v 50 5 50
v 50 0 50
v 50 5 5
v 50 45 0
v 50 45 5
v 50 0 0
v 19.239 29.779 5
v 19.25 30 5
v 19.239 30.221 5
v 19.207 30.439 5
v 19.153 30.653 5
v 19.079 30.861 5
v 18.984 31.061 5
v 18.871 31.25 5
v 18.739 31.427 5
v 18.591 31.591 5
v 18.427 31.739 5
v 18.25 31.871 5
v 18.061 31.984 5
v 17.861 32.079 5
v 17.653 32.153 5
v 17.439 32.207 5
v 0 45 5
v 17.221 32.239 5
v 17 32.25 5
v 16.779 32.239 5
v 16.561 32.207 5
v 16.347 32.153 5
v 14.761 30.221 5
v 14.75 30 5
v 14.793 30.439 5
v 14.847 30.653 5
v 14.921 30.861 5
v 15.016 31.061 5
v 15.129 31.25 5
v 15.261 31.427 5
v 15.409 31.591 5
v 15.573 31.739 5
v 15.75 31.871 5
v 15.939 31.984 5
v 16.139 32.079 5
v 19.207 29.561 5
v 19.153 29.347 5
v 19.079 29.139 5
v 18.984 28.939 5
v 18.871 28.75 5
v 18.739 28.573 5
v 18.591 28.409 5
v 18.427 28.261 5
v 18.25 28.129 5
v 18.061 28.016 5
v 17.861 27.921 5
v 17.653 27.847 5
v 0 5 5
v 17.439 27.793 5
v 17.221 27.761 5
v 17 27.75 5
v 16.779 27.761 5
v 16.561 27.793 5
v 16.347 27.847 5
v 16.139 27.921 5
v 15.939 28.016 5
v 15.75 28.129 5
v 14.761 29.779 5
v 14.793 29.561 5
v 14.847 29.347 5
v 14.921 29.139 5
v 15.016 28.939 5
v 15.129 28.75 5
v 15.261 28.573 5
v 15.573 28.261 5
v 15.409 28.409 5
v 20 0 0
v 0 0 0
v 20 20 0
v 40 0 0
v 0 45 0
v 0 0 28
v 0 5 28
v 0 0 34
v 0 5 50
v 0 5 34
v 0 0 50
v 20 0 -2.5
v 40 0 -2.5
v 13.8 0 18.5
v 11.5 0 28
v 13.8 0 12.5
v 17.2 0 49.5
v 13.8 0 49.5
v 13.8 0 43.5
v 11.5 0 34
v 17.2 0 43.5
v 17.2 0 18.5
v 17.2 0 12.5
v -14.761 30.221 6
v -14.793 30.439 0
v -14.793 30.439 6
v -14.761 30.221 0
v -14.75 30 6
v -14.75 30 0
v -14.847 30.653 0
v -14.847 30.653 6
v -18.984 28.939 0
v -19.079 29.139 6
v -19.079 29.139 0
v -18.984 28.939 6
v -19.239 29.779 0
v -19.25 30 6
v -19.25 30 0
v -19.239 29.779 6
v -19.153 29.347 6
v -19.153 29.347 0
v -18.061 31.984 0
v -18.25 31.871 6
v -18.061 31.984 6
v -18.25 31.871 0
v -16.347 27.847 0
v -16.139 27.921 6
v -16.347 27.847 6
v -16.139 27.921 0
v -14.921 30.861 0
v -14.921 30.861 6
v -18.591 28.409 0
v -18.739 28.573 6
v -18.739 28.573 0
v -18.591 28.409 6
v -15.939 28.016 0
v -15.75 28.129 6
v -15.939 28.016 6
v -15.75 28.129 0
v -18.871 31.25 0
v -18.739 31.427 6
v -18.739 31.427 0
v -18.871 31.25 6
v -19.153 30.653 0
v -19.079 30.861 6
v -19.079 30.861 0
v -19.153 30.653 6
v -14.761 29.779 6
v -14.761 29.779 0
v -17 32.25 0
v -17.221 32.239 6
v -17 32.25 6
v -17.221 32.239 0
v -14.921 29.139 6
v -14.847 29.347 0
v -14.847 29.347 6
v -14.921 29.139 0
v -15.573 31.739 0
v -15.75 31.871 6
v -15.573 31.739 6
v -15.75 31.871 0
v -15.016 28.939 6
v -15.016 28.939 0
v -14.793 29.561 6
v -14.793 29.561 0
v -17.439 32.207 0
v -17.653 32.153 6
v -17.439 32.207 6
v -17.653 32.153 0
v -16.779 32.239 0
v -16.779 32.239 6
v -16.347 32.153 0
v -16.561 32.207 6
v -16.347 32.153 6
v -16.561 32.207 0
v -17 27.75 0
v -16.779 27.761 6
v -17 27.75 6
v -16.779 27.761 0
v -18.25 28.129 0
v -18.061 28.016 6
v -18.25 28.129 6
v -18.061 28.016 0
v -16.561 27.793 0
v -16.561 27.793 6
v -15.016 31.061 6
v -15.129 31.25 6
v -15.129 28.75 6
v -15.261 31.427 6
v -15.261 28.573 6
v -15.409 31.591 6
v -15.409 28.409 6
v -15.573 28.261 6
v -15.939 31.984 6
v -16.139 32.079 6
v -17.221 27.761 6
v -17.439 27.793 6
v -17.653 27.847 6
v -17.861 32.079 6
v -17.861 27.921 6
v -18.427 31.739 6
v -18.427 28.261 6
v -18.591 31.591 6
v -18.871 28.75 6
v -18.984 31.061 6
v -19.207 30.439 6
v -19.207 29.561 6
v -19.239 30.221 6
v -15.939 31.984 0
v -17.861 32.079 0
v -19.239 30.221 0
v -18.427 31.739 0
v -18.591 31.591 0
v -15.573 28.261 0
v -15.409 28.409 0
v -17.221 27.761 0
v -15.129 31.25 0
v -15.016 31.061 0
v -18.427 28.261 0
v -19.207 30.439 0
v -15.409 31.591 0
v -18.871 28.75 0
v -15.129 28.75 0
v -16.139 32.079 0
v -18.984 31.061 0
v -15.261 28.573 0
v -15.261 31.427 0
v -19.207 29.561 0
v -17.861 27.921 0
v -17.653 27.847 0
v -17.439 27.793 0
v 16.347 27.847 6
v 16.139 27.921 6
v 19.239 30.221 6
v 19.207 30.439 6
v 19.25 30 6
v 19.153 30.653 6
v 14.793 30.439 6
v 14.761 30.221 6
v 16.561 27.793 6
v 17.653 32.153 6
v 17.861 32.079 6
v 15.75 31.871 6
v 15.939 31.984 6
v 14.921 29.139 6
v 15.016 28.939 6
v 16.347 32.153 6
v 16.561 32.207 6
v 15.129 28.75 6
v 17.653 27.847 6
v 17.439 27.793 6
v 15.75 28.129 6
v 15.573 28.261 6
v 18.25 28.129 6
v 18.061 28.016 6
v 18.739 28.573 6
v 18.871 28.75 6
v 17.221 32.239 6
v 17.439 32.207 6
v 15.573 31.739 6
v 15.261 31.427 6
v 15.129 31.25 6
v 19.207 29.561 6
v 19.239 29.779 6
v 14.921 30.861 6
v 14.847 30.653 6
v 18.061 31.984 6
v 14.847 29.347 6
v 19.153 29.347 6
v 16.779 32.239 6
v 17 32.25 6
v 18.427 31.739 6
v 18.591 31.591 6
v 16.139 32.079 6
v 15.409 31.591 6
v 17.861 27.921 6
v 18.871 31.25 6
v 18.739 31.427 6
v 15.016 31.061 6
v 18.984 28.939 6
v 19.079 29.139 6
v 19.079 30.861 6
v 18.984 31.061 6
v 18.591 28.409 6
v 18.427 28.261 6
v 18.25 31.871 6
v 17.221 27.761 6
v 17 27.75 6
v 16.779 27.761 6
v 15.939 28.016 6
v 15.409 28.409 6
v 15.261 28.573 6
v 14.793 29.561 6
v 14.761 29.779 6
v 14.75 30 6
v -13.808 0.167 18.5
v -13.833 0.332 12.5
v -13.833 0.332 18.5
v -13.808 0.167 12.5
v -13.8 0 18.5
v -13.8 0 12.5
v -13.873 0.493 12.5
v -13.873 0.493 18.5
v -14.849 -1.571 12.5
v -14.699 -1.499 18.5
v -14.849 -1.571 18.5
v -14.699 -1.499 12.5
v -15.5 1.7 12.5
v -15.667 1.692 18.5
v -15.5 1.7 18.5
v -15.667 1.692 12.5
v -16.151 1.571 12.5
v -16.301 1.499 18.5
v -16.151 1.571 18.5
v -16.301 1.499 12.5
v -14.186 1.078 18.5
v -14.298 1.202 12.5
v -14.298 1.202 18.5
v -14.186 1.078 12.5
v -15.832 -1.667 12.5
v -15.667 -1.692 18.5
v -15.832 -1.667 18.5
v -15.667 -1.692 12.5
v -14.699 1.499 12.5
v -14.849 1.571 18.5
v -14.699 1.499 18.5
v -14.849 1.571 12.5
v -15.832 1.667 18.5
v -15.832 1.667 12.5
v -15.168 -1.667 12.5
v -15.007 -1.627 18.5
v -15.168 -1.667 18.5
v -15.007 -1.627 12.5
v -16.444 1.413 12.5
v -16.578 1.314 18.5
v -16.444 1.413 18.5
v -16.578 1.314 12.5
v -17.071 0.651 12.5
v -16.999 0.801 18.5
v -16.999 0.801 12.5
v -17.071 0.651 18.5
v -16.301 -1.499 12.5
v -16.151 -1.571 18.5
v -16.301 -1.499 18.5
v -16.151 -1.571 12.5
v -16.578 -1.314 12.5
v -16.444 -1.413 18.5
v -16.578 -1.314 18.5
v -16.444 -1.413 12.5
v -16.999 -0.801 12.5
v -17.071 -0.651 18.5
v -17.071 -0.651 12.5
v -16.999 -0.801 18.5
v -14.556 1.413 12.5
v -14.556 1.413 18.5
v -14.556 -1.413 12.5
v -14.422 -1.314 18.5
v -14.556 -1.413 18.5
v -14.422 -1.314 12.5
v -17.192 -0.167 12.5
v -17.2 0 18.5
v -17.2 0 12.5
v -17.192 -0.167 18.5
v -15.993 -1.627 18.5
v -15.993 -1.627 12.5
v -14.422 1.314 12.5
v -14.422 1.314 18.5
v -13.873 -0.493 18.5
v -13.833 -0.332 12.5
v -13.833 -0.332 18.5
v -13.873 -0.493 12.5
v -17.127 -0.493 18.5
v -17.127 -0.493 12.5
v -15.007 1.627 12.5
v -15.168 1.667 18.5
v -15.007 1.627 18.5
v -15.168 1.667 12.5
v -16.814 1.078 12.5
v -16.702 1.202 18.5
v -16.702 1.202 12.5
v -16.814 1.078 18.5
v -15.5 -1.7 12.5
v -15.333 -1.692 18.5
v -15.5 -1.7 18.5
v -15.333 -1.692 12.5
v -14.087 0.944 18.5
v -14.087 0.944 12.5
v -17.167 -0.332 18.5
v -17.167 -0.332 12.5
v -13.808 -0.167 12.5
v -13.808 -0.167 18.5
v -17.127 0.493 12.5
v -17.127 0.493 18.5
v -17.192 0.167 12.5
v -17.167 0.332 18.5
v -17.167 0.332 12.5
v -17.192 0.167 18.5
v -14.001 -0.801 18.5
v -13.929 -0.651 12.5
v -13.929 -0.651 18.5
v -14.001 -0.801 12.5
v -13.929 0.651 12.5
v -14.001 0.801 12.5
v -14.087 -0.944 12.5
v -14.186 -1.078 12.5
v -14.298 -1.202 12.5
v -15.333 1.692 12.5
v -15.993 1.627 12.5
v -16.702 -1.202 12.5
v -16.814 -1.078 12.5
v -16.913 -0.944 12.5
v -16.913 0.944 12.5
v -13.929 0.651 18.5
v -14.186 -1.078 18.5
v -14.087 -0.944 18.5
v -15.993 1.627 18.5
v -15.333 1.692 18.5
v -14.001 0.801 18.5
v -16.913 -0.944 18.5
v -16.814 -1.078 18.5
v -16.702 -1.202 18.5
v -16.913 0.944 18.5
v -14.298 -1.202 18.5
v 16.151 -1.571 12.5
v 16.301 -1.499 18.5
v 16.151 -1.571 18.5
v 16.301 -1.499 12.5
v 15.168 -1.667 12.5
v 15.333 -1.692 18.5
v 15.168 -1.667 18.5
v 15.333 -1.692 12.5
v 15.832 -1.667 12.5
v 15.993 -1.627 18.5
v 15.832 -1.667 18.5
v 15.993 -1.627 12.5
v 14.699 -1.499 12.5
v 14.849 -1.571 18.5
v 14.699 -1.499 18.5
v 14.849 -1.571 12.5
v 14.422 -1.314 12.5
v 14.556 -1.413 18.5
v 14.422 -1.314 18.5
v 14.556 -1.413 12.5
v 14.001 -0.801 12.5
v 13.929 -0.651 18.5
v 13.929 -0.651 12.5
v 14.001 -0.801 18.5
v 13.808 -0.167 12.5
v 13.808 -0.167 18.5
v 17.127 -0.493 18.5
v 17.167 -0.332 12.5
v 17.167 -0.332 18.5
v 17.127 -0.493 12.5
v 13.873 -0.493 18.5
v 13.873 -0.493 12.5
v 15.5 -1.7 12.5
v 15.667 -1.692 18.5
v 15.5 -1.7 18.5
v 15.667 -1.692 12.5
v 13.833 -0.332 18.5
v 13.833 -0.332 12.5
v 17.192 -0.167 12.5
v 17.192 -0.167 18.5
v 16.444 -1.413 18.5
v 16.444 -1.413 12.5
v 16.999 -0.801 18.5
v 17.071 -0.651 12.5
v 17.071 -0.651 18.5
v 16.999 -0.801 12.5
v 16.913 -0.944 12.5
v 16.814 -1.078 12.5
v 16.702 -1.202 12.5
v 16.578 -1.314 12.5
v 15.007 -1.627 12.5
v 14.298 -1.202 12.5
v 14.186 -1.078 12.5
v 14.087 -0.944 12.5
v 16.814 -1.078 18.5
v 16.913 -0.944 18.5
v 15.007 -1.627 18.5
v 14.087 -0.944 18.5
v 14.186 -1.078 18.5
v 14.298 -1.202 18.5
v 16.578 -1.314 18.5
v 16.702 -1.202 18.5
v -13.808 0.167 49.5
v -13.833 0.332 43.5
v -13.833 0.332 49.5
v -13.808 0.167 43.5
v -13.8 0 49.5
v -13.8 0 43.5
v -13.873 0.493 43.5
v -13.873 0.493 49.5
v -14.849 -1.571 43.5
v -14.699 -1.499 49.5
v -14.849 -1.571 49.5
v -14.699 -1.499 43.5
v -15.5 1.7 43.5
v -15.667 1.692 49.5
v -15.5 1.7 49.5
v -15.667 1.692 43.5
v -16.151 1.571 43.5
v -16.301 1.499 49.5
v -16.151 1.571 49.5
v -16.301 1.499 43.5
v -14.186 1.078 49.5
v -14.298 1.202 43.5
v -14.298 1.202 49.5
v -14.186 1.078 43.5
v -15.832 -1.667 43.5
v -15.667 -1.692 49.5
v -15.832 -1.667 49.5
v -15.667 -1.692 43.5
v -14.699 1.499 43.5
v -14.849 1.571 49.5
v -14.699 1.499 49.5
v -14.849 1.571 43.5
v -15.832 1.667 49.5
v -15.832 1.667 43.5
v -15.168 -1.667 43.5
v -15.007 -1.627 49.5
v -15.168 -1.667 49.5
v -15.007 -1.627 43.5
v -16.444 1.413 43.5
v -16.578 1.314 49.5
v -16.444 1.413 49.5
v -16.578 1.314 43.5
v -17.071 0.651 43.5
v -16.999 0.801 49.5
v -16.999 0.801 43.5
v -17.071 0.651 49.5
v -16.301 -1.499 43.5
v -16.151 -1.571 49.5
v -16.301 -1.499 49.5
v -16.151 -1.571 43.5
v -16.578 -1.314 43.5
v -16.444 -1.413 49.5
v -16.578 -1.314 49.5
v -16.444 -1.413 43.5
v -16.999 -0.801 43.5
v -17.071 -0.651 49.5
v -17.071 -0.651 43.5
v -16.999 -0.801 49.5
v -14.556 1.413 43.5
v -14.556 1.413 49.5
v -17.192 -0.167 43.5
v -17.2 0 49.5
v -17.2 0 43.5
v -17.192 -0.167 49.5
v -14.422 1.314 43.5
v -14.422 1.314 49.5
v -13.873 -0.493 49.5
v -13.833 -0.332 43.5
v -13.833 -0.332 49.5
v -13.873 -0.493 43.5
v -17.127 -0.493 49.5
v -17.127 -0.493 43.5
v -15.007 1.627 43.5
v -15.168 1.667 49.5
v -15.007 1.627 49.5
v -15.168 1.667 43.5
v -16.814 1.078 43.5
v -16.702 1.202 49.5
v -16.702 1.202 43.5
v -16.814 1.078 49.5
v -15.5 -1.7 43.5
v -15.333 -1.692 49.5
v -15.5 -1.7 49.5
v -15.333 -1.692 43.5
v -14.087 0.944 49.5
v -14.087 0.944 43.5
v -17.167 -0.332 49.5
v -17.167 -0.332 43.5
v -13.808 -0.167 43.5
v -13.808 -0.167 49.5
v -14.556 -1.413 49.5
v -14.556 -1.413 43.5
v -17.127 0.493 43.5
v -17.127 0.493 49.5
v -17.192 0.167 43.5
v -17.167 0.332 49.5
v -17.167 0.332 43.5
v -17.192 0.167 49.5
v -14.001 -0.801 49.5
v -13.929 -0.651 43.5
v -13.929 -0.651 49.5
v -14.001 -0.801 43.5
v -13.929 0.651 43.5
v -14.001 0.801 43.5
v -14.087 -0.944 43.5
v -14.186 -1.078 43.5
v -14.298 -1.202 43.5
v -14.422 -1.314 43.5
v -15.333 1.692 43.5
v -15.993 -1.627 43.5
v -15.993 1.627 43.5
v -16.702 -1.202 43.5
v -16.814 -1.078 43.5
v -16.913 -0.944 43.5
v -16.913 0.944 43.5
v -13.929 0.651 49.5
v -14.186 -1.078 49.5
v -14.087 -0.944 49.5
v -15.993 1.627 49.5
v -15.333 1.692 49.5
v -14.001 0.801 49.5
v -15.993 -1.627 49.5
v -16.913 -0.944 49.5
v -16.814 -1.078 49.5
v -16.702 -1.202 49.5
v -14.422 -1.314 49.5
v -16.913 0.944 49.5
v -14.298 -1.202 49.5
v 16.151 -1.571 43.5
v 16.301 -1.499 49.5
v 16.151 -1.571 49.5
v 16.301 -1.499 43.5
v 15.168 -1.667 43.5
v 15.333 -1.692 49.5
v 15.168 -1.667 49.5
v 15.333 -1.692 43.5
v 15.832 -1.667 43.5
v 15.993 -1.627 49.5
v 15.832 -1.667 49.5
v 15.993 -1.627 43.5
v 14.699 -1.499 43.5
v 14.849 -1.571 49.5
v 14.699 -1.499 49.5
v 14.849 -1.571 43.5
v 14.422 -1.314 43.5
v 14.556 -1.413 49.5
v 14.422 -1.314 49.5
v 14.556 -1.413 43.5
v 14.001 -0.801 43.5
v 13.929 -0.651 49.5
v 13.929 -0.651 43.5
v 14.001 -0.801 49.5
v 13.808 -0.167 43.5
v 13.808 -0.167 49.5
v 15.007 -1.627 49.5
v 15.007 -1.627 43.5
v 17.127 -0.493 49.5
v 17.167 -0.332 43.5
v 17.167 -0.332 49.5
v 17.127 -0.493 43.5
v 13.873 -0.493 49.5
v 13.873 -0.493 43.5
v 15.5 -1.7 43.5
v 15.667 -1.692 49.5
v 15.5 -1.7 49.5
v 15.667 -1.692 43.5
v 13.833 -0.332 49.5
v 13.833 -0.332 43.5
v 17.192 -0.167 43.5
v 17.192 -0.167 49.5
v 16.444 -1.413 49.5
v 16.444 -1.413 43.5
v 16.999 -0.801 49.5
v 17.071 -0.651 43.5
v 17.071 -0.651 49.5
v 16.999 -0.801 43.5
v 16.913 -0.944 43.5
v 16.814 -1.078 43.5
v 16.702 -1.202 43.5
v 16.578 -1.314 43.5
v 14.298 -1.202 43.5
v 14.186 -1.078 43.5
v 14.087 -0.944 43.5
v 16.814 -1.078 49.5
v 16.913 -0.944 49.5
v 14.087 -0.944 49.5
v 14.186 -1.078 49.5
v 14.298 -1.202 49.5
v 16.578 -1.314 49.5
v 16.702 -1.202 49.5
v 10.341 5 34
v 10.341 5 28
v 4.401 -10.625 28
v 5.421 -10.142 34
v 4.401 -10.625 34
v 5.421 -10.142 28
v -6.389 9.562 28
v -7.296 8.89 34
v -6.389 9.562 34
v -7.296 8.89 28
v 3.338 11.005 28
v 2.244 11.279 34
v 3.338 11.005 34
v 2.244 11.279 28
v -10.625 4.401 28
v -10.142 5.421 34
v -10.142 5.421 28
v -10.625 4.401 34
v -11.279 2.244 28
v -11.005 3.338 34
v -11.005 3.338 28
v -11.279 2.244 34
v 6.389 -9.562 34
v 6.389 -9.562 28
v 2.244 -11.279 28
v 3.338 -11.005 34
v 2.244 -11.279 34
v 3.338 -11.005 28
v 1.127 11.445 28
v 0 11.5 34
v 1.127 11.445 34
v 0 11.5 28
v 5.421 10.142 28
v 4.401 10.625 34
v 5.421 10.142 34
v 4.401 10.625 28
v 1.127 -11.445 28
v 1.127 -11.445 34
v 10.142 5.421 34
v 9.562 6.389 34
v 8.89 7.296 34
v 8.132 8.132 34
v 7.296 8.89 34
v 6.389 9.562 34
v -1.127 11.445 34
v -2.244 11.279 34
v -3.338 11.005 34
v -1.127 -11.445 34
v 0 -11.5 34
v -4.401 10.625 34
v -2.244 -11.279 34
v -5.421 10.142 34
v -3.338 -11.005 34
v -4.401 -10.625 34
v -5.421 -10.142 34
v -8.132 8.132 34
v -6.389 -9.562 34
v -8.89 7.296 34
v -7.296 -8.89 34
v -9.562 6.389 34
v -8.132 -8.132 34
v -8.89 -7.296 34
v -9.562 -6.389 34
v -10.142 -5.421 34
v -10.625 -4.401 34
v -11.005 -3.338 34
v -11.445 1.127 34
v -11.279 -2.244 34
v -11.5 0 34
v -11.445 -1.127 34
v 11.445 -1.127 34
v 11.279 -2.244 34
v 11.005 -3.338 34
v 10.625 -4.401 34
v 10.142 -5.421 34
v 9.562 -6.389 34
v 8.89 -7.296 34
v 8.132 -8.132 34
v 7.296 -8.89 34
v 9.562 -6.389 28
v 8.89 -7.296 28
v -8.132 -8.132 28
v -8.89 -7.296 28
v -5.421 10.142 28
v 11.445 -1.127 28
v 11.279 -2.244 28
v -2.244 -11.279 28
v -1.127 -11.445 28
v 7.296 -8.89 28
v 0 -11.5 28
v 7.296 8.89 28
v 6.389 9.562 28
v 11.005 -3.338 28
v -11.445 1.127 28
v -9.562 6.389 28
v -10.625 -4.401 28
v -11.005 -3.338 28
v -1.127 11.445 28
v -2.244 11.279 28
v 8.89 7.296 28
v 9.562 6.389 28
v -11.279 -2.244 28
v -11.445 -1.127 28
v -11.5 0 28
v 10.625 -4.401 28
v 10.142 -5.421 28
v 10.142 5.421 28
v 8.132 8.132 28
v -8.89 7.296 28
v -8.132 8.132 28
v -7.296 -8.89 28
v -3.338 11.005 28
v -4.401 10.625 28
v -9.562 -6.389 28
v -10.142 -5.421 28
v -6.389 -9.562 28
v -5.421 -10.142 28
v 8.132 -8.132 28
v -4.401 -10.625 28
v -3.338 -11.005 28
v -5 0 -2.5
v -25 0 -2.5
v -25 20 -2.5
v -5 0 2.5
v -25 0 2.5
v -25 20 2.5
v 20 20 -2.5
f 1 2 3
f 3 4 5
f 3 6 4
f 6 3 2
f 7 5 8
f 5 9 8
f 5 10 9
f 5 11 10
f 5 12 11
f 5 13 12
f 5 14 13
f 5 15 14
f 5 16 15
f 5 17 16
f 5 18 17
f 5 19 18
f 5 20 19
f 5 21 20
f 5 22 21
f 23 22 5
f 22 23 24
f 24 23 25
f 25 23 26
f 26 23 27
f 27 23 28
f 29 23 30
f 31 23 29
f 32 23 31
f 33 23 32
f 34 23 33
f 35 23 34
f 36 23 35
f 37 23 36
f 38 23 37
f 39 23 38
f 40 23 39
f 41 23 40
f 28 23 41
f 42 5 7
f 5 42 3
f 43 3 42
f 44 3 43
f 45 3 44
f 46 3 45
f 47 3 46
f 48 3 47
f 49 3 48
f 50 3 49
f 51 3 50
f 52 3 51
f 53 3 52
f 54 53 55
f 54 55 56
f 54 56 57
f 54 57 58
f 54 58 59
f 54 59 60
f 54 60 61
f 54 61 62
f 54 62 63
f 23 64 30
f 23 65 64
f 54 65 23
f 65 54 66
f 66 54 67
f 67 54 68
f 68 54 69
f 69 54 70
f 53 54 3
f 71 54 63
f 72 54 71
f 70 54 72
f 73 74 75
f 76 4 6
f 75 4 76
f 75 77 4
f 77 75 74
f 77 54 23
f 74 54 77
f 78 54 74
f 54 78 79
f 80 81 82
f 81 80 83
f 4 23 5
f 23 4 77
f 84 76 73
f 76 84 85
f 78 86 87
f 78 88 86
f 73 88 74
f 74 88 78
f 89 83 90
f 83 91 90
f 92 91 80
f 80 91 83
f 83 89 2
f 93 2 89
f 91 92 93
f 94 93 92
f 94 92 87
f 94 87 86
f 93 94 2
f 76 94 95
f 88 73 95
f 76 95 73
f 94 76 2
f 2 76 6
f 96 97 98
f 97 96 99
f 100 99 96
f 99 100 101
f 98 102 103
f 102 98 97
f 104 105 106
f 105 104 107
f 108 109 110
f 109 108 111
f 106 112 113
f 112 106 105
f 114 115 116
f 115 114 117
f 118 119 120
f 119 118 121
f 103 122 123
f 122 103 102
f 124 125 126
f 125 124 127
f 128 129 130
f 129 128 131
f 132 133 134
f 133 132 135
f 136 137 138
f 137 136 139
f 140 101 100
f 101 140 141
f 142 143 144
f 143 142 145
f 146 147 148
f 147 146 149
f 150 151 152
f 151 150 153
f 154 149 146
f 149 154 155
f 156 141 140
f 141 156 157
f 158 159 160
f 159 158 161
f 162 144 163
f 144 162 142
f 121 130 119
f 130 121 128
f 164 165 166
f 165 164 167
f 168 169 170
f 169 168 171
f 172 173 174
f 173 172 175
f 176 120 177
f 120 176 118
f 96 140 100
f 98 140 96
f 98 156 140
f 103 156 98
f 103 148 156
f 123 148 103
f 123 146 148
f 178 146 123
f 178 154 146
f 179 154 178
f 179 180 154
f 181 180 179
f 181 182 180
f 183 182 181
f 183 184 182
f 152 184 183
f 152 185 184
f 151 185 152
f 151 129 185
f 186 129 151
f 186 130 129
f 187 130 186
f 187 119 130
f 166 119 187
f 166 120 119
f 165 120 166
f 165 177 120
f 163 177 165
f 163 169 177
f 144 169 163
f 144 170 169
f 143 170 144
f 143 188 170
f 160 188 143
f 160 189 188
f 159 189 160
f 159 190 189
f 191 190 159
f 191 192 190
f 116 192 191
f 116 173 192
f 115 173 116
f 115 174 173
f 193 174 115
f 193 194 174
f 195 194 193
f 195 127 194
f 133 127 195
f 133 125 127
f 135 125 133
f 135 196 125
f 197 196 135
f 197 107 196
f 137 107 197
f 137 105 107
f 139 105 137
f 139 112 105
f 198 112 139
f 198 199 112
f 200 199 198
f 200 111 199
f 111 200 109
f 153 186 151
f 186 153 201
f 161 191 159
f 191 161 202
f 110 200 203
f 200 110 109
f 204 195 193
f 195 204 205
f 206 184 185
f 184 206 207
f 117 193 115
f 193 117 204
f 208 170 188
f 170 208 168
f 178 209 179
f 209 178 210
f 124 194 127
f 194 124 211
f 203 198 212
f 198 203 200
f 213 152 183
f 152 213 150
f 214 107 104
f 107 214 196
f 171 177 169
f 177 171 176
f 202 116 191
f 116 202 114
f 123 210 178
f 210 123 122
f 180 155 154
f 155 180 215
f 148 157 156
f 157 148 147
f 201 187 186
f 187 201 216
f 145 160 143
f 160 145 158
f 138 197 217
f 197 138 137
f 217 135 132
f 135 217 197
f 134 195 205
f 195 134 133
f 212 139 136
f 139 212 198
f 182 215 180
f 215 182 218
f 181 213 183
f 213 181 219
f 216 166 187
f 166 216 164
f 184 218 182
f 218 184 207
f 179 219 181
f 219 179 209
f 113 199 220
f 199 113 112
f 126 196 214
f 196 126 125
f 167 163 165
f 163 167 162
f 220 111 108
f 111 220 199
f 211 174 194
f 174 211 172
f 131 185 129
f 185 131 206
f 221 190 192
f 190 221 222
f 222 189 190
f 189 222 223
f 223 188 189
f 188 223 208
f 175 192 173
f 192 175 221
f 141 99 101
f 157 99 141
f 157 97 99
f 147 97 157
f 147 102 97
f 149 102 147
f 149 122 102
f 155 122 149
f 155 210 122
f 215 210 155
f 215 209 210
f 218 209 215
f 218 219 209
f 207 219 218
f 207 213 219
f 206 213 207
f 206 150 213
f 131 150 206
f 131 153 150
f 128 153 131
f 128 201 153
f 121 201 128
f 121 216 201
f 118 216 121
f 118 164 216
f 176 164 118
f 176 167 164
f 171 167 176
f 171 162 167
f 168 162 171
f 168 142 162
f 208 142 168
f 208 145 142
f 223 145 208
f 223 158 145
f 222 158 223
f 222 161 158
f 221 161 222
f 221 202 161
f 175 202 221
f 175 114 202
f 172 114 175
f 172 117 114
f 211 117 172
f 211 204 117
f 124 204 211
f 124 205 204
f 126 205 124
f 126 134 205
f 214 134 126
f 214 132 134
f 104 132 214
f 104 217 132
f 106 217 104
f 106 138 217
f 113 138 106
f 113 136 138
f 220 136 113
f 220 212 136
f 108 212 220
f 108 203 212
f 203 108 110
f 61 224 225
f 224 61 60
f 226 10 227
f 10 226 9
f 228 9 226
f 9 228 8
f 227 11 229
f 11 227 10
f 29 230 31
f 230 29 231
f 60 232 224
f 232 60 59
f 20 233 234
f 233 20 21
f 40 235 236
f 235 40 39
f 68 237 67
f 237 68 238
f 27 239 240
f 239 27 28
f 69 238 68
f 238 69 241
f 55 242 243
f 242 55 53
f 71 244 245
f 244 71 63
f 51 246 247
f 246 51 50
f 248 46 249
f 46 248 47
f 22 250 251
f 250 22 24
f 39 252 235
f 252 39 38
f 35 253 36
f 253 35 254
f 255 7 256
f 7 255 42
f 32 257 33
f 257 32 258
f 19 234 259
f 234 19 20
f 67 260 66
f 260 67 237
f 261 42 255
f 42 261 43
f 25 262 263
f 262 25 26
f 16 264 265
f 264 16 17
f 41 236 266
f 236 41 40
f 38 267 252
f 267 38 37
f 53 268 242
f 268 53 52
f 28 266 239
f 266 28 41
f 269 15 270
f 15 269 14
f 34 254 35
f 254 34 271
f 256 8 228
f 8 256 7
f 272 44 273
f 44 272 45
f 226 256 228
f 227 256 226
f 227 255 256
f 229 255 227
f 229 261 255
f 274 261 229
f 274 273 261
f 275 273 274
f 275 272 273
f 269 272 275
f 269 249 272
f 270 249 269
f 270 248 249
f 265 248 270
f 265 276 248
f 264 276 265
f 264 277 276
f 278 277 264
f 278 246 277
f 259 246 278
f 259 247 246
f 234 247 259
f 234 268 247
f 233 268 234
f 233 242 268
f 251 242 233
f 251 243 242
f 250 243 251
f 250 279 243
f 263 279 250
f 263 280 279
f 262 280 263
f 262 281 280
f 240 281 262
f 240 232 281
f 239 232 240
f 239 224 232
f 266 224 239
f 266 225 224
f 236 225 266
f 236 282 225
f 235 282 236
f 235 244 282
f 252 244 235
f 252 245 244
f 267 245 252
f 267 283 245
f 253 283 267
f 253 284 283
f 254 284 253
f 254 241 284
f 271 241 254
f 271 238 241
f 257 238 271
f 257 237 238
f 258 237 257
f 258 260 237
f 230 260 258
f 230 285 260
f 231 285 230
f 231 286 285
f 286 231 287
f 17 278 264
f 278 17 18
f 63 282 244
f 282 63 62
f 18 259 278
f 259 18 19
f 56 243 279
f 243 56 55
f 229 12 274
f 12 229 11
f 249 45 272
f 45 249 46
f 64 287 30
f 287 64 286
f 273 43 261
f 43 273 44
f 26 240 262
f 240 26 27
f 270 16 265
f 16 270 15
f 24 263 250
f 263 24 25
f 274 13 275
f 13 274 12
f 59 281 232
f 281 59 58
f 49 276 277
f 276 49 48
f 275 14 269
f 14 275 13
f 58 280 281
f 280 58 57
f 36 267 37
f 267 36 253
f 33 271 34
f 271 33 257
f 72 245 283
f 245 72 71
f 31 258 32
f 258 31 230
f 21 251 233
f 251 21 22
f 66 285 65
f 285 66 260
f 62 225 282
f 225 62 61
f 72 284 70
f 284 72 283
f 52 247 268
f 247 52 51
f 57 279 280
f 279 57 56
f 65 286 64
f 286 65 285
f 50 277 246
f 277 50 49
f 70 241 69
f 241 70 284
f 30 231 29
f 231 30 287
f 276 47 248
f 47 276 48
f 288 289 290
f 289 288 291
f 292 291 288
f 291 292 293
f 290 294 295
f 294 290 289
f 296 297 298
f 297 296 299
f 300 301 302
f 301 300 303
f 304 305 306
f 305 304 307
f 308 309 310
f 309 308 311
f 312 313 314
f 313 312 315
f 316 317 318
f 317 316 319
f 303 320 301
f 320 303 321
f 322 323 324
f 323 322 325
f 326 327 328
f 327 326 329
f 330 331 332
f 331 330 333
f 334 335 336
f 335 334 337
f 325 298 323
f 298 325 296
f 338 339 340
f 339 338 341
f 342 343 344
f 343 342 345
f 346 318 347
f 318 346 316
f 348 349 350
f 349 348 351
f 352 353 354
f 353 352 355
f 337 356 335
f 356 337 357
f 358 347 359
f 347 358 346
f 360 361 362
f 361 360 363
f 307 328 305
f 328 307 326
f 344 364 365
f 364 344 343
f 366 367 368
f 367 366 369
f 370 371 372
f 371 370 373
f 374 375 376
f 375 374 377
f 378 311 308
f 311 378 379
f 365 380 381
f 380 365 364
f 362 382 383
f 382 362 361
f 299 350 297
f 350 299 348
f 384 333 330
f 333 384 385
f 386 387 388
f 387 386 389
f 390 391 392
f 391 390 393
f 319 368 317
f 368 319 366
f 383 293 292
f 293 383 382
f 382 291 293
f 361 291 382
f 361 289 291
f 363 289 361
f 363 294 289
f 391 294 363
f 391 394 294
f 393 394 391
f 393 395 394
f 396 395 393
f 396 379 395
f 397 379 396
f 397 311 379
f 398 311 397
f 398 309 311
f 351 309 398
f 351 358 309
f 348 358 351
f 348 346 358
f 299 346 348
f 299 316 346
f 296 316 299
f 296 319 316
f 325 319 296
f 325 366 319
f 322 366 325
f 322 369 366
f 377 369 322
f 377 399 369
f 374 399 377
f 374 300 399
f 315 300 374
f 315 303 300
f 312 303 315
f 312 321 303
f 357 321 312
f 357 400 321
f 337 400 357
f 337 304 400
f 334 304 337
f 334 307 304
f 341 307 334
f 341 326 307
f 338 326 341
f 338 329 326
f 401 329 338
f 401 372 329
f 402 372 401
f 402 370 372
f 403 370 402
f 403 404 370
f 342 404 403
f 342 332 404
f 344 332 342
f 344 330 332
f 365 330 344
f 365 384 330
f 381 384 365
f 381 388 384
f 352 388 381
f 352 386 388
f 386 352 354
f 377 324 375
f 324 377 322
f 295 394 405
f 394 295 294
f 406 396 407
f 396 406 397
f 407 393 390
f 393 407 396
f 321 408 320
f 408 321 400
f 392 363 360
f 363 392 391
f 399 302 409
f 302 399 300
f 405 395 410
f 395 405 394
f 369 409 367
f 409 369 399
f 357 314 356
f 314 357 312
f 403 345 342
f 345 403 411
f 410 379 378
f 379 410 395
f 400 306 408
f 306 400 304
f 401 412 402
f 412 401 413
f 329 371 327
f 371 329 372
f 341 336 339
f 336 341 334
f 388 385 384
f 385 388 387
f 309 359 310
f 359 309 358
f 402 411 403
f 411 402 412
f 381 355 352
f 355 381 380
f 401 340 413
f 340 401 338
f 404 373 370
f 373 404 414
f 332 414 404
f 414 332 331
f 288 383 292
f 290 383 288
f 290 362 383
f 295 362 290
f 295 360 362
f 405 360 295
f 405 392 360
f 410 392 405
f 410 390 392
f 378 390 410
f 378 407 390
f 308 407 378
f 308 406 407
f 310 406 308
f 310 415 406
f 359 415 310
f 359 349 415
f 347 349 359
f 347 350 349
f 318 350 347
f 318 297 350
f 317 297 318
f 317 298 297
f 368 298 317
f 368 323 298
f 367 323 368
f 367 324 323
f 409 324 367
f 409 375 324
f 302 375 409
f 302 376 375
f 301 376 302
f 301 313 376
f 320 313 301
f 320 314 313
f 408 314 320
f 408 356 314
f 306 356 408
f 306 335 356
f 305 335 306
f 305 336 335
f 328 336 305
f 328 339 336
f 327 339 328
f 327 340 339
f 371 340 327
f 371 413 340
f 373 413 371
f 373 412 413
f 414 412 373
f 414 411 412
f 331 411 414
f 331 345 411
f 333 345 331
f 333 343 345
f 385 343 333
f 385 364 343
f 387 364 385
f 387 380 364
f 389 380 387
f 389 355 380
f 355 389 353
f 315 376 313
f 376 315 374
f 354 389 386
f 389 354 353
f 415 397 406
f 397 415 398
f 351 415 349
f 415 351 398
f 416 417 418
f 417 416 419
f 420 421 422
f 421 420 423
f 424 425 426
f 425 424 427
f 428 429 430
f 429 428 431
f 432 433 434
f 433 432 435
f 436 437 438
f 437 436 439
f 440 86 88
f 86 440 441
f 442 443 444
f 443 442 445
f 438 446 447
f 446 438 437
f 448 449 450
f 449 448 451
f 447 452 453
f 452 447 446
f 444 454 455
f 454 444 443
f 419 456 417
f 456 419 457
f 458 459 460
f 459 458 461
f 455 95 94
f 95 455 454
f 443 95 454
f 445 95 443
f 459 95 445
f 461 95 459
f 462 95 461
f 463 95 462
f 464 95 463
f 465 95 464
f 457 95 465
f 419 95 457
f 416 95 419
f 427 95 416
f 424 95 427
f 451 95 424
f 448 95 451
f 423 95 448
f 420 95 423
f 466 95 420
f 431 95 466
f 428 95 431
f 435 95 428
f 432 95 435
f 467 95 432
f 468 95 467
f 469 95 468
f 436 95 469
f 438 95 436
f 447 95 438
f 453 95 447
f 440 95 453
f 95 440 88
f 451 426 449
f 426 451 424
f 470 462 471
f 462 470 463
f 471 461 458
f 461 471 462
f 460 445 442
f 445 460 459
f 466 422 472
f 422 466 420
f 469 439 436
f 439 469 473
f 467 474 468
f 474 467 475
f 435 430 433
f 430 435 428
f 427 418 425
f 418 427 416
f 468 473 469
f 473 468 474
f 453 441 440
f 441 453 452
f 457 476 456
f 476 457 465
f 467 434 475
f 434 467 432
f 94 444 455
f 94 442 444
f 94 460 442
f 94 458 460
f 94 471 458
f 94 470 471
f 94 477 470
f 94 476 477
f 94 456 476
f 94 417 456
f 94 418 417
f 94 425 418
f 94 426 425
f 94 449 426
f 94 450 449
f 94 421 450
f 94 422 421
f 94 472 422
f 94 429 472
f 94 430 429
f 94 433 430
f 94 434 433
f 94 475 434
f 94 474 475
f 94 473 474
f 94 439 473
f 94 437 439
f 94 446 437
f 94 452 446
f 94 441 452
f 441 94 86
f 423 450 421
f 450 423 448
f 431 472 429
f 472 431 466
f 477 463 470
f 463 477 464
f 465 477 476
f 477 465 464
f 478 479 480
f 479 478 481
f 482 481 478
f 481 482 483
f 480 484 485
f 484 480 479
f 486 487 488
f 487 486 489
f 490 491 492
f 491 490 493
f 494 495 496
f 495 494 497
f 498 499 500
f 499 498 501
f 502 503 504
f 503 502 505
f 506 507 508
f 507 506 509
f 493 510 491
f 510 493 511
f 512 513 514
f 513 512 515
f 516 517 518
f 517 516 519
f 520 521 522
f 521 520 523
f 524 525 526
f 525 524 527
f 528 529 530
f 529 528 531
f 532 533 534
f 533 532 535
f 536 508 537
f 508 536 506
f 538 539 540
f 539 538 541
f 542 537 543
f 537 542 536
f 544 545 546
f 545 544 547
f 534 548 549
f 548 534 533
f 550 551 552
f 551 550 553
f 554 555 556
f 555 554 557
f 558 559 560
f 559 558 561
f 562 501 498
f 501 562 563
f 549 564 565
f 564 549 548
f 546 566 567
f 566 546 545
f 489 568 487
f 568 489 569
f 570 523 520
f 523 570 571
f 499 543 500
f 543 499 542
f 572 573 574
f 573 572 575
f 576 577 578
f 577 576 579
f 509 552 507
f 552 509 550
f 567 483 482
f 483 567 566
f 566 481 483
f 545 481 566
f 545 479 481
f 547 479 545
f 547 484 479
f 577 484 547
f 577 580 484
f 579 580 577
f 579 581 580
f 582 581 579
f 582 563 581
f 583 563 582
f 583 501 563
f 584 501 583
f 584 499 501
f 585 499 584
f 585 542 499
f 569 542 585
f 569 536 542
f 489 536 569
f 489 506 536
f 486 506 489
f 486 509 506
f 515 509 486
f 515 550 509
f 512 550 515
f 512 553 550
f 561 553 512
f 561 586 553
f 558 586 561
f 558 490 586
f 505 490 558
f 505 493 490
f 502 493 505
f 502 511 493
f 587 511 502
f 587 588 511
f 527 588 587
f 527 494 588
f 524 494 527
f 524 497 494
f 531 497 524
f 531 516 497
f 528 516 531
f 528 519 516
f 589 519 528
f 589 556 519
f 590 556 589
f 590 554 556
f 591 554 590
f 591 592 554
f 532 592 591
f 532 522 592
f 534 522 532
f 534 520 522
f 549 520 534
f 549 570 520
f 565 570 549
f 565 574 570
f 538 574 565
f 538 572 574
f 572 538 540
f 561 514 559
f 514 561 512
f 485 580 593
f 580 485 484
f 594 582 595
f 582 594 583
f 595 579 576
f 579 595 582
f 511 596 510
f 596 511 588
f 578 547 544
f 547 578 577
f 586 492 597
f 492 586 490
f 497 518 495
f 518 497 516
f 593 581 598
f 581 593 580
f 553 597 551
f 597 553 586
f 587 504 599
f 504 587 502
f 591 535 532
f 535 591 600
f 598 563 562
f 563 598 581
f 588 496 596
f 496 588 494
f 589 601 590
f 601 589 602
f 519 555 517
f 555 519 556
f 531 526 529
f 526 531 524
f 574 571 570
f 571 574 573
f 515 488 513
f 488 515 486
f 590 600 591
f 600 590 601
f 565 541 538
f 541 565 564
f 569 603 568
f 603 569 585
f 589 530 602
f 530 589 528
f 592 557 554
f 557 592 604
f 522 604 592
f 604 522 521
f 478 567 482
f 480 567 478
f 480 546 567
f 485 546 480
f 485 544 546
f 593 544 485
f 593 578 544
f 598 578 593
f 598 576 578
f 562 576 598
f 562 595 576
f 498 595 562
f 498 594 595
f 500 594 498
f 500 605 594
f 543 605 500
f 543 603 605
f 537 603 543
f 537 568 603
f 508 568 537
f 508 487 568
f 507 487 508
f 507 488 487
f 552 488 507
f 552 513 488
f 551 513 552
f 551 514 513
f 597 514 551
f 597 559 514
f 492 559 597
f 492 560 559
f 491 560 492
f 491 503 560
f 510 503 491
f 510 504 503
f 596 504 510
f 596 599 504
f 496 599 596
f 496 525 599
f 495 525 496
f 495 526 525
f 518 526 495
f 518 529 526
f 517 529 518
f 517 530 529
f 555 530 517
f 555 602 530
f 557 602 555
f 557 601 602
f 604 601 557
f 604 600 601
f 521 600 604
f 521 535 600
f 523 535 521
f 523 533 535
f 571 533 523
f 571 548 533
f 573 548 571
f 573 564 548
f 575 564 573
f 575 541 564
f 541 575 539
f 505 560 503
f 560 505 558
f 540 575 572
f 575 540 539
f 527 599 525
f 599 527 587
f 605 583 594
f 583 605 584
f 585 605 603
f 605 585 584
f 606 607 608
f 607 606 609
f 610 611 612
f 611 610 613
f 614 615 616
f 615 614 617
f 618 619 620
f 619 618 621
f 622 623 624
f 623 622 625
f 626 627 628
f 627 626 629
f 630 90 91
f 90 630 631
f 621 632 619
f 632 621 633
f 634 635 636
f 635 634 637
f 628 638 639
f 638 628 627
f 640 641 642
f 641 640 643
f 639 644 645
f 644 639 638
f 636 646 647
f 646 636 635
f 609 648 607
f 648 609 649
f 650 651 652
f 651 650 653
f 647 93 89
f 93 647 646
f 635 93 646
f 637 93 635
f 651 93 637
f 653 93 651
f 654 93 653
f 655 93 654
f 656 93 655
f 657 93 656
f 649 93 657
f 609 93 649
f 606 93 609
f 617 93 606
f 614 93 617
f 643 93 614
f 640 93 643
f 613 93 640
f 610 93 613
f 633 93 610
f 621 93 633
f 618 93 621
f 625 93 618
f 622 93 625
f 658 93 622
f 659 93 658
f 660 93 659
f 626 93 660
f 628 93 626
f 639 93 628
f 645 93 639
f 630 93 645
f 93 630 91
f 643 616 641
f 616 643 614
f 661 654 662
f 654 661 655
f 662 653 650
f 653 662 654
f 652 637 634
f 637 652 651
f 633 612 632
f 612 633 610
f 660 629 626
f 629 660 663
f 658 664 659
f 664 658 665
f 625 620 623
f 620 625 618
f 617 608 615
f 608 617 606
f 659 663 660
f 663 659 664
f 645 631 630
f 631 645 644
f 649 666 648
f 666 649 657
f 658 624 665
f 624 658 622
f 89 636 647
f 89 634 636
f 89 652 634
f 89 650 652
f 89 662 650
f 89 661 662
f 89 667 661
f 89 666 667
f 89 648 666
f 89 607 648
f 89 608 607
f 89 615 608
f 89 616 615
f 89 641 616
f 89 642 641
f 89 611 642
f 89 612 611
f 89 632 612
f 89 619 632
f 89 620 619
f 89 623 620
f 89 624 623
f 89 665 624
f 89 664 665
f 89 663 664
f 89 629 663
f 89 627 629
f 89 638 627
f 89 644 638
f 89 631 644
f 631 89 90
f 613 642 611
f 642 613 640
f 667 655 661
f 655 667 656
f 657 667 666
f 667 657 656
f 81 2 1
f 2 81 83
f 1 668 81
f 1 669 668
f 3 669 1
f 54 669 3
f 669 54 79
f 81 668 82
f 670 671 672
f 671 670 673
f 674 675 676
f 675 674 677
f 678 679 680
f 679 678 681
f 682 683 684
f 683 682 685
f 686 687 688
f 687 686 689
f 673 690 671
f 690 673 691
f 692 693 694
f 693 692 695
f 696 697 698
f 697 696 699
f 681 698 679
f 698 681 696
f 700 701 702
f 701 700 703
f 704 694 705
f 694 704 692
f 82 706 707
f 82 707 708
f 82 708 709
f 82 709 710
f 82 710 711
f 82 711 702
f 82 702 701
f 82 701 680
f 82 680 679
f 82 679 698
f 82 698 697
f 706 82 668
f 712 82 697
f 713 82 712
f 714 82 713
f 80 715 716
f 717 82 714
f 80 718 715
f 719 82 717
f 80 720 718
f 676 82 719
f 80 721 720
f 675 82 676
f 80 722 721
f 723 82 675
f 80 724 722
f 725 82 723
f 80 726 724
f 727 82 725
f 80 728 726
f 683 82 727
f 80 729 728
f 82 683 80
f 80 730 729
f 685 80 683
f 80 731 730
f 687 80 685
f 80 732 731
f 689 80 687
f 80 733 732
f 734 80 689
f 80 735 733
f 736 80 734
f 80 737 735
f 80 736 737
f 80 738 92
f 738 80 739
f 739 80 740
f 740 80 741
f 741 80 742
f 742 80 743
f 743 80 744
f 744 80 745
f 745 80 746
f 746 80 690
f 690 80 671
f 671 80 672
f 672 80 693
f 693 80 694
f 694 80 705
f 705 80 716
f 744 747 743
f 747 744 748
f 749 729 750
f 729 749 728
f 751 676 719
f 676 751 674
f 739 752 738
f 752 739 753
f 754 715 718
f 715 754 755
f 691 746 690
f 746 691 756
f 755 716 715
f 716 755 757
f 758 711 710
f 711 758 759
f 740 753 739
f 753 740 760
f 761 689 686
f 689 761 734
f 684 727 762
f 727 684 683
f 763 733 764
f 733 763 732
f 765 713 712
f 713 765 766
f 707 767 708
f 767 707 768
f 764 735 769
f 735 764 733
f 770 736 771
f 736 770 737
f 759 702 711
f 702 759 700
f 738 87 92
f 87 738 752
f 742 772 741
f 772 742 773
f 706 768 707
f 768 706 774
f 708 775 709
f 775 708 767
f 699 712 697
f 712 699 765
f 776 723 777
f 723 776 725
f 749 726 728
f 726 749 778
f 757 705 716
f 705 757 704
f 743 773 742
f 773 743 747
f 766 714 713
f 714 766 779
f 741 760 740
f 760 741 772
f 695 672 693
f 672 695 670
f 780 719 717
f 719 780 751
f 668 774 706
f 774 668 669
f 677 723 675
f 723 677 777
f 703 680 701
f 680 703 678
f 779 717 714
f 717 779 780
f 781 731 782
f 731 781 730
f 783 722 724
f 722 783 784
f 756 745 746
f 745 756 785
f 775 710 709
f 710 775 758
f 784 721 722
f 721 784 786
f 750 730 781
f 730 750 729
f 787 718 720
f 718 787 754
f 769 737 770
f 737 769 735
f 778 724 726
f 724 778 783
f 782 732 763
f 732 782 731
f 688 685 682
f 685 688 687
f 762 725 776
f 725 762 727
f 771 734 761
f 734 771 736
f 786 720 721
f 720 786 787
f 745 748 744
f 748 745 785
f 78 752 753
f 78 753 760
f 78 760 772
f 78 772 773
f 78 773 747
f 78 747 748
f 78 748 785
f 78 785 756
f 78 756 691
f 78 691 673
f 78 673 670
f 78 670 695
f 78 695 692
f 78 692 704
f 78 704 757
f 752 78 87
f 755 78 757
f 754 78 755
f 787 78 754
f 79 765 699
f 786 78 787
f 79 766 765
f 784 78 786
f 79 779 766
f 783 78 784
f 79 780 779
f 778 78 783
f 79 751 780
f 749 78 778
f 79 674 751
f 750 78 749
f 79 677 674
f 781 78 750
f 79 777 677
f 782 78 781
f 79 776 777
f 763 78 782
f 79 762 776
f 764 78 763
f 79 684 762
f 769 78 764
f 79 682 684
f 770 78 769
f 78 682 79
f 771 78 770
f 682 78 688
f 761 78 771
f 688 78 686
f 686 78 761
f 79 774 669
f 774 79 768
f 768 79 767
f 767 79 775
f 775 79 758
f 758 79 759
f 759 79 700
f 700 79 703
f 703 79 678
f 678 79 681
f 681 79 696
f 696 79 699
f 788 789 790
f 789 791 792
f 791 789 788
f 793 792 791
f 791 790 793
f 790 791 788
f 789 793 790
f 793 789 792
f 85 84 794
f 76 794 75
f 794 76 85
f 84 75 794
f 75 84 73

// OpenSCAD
// NEMA 17 Stepper Motor L-Bracket
// Print orientation: Base plate on XY plane (Z=0), building upward.

// Base Plate Dimensions
$base_width_x = 50;   // x from -25 to 25
$base_length_y = 45;  // y from 0 to 45
$base_height_z = 5;   // z from 0 to 5

// Base Mounting Holes (M4)
$base_hole_diameter = 4.5;
$base_hole_x1 = -17;
$base_hole_y1 = 30;
$base_hole_x2 = 17;
$base_hole_y2 = 30;

// Vertical Motor Plate Dimensions
$plate_width_x = 50;  // x from -25 to 25
$plate_thickness_y = 5; // y from 0 to 5
$plate_height_z = 50;  // z from 0 to 50

// Motor Boss Hole
$boss_hole_diameter = 23;
$boss_hole_x = 0;
$boss_hole_z = 28;

// Motor Screw Holes (M3)
$screw_hole_diameter = 3.4;
$screw_pattern_size = 31; // 31mm square pattern
$screw_hole_count = 4;

// Gusset Dimensions
$gusset_thickness = 5;
$gusset_leg_y = 20;
$gusset_leg_z = 20;
$gusset_left_x_start = -25;
$gusset_left_x_end = -20;
$gusset_right_x_start = 20;
$gusset_right_x_end = 25;

// General Settings
$fn = 64;

module base_plate() {
    // Main block
    translate([0, 0, 0])
        cube([$base_width_x, $base_length_y, $base_height_z]);

    // Through-holes (cutting shapes must extend past faces)
    // Hole 1
    translate([$base_hole_x1, $base_hole_y1, 0])
        cylinder(h = $base_height_z + 1, d = $base_hole_diameter, $fn = 64);
    
    // Hole 2
    translate([$base_hole_x2, $base_hole_y2, 0])
        cylinder(h = $base_height_z + 1, d = $base_hole_diameter, $fn = 64);
}

module motor_plate() {
    // Main block standing on the back edge of the base (y=0 to y=5)
    translate([0, 0, 0])
        cube([$plate_width_x, $plate_thickness_y, $plate_height_z]);

    // Boss hole (along Y axis)
    translate([0, 0, $boss_hole_z])
        cylinder(h = $plate_thickness_y + 1, d = $boss_hole_diameter, $fn = 64);

    // Screw holes (31mm square pattern centered on boss hole)
    // Pattern center is at x=0, z=28.
    // Square size 31mm -> half size 15.5mm.
    $offset = $screw_pattern_size / 2;
    
    for (i = [0:3]) {
        // Calculate corner positions based on index using modulo arithmetic
        // 0: bottom-left, 1: bottom-right, 2: top-right, 3: top-left
        // x_offset = -offset if i is even, +offset if i is odd
        // z_offset = -offset if i < 2, +offset if i >= 2
        tx = (i % 2 == 0) ? -$offset : $offset;
        tz = (i < 2) ? -$offset : $offset;
        
        translate([tx, 0, $boss_hole_z + tz])
            cylinder(h = $plate_thickness_y + 1, d = $screw_hole_diameter, $fn = 64);
    }
}

module gusset() {
    // Right triangle in YZ plane, extruded along X.
    // Right angle corner at y=5, z=5 relative to the main block's local origin (0,0,0).
    // Legs: 20mm along +Y, 20mm along +Z.
    // Thickness: 5mm along X.
    // The polygon is defined relative to the corner (0,0) in the local extrusion space.
    // Point 1: (0,0) -> corresponds to y=5, z=5 in global
    // Point 2: (20,0) -> corresponds to y=25, z=5 in global
    // Point 3: (0,20) -> corresponds to y=5, z=25 in global
    
    translate([0, 0, 0])
        linear_extrude(height = $gusset_thickness, center = true)
            polygon(points = [
                [0, 0],          // Relative to corner
                [$gusset_leg_y, 0], // Relative (20,0)
                [0, $gusset_leg_z]  // Relative (0,20)
            ], $fn = 64);
}

module main() {
    difference() {
        union() {
            base_plate();
            motor_plate();
            
            // Left Gusset (x from -25 to -20)
            // The gusset module creates a shape from x=0 to x=5 (thickness).
            // We translate it to start at -25.
            translate([$gusset_left_x_start, 0, 0])
                gusset();
            
            // Right Gusset (x from 20 to 25)
            // We translate it to start at 20.
            translate([$gusset_right_x_start, 0, 0])
                gusset();
        }
        
        // No additional cuts needed for the gussets as they are part of the union.
        // The difference block only cuts holes from the base and motor plate.
    }
}

main();
